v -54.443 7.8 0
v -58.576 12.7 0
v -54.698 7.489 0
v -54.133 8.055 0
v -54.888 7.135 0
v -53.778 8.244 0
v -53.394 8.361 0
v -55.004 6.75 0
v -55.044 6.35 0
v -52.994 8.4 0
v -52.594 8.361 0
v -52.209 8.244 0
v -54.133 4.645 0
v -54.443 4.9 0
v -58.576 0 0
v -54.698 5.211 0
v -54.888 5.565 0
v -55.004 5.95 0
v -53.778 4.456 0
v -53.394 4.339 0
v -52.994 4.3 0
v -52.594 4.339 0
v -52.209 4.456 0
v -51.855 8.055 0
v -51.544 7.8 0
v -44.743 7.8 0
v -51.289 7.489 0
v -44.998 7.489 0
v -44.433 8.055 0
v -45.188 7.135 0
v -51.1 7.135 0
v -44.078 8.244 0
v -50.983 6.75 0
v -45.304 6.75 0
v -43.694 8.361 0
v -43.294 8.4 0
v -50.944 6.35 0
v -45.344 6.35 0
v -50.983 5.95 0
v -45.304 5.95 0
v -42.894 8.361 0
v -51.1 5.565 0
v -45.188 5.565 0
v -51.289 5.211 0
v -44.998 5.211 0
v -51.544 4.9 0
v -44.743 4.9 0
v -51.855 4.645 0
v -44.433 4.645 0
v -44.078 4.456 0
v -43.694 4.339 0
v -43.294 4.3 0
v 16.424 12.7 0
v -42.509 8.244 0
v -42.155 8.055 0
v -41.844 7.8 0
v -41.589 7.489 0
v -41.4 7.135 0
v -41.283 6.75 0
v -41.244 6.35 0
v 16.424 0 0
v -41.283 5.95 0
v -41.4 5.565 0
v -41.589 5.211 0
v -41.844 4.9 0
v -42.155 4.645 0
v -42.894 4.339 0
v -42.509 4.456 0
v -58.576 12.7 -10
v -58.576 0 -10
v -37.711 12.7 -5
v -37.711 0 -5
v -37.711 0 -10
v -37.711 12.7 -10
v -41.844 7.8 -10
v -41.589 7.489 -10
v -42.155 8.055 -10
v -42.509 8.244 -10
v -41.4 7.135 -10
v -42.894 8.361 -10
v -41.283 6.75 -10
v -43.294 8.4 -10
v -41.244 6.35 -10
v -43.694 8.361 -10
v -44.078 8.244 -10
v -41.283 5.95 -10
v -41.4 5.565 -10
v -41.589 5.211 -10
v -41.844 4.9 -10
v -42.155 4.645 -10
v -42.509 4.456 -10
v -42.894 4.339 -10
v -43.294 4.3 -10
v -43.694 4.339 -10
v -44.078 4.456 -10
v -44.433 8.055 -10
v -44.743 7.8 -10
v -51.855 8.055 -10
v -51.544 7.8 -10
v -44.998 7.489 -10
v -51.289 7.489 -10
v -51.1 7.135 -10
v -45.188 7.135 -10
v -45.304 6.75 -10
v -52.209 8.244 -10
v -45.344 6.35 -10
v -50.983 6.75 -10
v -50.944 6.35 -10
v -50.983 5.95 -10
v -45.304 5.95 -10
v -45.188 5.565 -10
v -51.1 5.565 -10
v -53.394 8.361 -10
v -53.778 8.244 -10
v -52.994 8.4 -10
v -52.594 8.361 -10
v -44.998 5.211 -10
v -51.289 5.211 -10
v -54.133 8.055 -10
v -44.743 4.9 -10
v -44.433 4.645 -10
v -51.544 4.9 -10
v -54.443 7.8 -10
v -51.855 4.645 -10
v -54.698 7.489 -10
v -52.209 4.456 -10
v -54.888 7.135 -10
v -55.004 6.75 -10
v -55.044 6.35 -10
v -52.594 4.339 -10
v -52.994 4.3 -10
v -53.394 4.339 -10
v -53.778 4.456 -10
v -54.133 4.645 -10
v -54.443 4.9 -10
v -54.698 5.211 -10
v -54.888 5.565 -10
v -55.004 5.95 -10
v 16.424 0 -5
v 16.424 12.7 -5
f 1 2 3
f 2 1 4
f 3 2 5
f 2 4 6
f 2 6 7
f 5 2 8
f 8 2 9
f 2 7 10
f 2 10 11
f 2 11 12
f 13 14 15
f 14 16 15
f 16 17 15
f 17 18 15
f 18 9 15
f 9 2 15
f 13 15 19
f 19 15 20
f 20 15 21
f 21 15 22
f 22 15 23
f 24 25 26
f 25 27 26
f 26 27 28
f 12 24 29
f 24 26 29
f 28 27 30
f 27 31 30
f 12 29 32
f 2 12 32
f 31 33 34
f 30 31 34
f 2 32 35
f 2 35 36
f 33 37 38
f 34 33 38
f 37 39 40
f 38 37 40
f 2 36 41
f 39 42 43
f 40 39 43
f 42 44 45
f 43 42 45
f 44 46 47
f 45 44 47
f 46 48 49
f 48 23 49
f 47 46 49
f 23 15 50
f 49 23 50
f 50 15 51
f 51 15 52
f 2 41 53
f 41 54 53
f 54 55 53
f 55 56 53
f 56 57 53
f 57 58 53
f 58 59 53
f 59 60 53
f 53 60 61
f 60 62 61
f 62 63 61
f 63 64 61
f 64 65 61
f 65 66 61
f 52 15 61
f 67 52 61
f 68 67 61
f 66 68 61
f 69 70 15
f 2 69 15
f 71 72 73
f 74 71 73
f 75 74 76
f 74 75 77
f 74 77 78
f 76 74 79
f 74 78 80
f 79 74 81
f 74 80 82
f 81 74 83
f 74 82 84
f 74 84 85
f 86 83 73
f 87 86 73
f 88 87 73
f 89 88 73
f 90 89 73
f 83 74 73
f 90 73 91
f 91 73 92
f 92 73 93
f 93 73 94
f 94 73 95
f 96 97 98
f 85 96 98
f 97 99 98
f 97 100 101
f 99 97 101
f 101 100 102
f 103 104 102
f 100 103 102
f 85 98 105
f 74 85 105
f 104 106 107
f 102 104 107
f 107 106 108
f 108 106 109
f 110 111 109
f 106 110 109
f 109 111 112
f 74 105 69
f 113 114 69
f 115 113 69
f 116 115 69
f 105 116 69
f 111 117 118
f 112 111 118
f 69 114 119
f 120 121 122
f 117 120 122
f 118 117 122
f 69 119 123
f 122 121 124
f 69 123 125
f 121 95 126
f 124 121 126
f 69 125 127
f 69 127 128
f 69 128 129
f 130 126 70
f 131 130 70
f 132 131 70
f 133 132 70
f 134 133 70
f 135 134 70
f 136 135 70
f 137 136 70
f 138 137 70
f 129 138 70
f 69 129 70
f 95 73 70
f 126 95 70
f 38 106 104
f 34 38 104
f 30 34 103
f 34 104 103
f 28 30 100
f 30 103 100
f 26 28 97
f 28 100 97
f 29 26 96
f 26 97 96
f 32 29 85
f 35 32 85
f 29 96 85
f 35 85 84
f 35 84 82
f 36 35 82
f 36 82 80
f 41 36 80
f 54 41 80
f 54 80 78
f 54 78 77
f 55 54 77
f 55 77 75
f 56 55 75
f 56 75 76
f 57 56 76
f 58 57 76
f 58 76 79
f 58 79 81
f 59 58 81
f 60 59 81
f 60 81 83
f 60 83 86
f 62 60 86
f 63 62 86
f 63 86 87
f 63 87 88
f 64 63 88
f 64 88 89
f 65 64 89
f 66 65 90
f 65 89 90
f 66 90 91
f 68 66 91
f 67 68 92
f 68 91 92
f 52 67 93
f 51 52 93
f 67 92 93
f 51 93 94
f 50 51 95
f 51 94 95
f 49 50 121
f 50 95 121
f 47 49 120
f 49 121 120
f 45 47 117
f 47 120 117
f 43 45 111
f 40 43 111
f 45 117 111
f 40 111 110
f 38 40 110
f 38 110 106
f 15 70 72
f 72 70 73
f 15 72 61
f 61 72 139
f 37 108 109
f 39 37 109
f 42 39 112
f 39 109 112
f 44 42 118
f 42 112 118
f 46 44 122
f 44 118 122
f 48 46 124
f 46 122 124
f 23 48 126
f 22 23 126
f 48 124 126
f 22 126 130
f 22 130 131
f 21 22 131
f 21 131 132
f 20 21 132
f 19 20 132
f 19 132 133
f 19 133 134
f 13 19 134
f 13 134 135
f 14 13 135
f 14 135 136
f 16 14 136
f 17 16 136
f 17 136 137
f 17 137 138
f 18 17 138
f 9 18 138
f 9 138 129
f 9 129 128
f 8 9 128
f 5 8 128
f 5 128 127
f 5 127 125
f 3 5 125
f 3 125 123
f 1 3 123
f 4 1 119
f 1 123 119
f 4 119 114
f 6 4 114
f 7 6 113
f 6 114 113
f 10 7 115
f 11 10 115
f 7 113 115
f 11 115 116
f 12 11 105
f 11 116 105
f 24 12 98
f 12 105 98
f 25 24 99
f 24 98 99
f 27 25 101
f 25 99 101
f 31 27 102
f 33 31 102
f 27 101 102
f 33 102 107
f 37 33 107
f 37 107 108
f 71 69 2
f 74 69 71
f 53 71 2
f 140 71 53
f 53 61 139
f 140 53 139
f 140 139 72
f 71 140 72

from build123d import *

# Parameters (mm, degrees)
BOSS_EXTRUDE1_DEPTH = 12.7
CUT_EXTRUDE1_DEPTH  = 12.7


with BuildPart() as part:
    # Sketch1 → Boss-Extrude1 (new body)
    with BuildSketch(Plane(origin=(0, 0, 0), x_dir=(1, 0, 0), z_dir=(0, 1, 0))):
        Polygon((-58.57612782, 0), (16.42387218, 0), (16.42387218, 5), (-37.711466165, 5), (-37.711466165, 10), (-58.57612782, 10), align=None)
    extrude(amount=BOSS_EXTRUDE1_DEPTH)

    # Sketch2 → Cut-Extrude1 (cut)
    with BuildSketch(Plane(origin=(0, 0, -10), x_dir=(-1, 0, 0), z_dir=(0, 0, -1))):
        with BuildLine():
            ThreePointArc((41.243796992, 6.35), (43.293796992, 4.3), (45.343796992, 6.35))
            Line((45.343796992, 6.35), (41.243796992, 6.35))
        make_face()
        with BuildLine():
            Line((41.243796992, 6.35), (45.343796992, 6.35))
            ThreePointArc((45.343796992, 6.35), (43.293796992, 8.4), (41.243796992, 6.35))
        make_face()
        with BuildLine():
            ThreePointArc((55.043796992, 6.35), (52.993796992, 8.4), (50.943796992, 6.35))
            Line((50.943796992, 6.35), (55.043796992, 6.35))
        make_face()
        with BuildLine():
            Line((55.043796992, 6.35), (50.943796992, 6.35))
            ThreePointArc((50.943796992, 6.35), (52.993796992, 4.3), (55.043796992, 6.35))
        make_face()
    extrude(amount=-CUT_EXTRUDE1_DEPTH, mode=Mode.SUBTRACT)


solid = part.part
